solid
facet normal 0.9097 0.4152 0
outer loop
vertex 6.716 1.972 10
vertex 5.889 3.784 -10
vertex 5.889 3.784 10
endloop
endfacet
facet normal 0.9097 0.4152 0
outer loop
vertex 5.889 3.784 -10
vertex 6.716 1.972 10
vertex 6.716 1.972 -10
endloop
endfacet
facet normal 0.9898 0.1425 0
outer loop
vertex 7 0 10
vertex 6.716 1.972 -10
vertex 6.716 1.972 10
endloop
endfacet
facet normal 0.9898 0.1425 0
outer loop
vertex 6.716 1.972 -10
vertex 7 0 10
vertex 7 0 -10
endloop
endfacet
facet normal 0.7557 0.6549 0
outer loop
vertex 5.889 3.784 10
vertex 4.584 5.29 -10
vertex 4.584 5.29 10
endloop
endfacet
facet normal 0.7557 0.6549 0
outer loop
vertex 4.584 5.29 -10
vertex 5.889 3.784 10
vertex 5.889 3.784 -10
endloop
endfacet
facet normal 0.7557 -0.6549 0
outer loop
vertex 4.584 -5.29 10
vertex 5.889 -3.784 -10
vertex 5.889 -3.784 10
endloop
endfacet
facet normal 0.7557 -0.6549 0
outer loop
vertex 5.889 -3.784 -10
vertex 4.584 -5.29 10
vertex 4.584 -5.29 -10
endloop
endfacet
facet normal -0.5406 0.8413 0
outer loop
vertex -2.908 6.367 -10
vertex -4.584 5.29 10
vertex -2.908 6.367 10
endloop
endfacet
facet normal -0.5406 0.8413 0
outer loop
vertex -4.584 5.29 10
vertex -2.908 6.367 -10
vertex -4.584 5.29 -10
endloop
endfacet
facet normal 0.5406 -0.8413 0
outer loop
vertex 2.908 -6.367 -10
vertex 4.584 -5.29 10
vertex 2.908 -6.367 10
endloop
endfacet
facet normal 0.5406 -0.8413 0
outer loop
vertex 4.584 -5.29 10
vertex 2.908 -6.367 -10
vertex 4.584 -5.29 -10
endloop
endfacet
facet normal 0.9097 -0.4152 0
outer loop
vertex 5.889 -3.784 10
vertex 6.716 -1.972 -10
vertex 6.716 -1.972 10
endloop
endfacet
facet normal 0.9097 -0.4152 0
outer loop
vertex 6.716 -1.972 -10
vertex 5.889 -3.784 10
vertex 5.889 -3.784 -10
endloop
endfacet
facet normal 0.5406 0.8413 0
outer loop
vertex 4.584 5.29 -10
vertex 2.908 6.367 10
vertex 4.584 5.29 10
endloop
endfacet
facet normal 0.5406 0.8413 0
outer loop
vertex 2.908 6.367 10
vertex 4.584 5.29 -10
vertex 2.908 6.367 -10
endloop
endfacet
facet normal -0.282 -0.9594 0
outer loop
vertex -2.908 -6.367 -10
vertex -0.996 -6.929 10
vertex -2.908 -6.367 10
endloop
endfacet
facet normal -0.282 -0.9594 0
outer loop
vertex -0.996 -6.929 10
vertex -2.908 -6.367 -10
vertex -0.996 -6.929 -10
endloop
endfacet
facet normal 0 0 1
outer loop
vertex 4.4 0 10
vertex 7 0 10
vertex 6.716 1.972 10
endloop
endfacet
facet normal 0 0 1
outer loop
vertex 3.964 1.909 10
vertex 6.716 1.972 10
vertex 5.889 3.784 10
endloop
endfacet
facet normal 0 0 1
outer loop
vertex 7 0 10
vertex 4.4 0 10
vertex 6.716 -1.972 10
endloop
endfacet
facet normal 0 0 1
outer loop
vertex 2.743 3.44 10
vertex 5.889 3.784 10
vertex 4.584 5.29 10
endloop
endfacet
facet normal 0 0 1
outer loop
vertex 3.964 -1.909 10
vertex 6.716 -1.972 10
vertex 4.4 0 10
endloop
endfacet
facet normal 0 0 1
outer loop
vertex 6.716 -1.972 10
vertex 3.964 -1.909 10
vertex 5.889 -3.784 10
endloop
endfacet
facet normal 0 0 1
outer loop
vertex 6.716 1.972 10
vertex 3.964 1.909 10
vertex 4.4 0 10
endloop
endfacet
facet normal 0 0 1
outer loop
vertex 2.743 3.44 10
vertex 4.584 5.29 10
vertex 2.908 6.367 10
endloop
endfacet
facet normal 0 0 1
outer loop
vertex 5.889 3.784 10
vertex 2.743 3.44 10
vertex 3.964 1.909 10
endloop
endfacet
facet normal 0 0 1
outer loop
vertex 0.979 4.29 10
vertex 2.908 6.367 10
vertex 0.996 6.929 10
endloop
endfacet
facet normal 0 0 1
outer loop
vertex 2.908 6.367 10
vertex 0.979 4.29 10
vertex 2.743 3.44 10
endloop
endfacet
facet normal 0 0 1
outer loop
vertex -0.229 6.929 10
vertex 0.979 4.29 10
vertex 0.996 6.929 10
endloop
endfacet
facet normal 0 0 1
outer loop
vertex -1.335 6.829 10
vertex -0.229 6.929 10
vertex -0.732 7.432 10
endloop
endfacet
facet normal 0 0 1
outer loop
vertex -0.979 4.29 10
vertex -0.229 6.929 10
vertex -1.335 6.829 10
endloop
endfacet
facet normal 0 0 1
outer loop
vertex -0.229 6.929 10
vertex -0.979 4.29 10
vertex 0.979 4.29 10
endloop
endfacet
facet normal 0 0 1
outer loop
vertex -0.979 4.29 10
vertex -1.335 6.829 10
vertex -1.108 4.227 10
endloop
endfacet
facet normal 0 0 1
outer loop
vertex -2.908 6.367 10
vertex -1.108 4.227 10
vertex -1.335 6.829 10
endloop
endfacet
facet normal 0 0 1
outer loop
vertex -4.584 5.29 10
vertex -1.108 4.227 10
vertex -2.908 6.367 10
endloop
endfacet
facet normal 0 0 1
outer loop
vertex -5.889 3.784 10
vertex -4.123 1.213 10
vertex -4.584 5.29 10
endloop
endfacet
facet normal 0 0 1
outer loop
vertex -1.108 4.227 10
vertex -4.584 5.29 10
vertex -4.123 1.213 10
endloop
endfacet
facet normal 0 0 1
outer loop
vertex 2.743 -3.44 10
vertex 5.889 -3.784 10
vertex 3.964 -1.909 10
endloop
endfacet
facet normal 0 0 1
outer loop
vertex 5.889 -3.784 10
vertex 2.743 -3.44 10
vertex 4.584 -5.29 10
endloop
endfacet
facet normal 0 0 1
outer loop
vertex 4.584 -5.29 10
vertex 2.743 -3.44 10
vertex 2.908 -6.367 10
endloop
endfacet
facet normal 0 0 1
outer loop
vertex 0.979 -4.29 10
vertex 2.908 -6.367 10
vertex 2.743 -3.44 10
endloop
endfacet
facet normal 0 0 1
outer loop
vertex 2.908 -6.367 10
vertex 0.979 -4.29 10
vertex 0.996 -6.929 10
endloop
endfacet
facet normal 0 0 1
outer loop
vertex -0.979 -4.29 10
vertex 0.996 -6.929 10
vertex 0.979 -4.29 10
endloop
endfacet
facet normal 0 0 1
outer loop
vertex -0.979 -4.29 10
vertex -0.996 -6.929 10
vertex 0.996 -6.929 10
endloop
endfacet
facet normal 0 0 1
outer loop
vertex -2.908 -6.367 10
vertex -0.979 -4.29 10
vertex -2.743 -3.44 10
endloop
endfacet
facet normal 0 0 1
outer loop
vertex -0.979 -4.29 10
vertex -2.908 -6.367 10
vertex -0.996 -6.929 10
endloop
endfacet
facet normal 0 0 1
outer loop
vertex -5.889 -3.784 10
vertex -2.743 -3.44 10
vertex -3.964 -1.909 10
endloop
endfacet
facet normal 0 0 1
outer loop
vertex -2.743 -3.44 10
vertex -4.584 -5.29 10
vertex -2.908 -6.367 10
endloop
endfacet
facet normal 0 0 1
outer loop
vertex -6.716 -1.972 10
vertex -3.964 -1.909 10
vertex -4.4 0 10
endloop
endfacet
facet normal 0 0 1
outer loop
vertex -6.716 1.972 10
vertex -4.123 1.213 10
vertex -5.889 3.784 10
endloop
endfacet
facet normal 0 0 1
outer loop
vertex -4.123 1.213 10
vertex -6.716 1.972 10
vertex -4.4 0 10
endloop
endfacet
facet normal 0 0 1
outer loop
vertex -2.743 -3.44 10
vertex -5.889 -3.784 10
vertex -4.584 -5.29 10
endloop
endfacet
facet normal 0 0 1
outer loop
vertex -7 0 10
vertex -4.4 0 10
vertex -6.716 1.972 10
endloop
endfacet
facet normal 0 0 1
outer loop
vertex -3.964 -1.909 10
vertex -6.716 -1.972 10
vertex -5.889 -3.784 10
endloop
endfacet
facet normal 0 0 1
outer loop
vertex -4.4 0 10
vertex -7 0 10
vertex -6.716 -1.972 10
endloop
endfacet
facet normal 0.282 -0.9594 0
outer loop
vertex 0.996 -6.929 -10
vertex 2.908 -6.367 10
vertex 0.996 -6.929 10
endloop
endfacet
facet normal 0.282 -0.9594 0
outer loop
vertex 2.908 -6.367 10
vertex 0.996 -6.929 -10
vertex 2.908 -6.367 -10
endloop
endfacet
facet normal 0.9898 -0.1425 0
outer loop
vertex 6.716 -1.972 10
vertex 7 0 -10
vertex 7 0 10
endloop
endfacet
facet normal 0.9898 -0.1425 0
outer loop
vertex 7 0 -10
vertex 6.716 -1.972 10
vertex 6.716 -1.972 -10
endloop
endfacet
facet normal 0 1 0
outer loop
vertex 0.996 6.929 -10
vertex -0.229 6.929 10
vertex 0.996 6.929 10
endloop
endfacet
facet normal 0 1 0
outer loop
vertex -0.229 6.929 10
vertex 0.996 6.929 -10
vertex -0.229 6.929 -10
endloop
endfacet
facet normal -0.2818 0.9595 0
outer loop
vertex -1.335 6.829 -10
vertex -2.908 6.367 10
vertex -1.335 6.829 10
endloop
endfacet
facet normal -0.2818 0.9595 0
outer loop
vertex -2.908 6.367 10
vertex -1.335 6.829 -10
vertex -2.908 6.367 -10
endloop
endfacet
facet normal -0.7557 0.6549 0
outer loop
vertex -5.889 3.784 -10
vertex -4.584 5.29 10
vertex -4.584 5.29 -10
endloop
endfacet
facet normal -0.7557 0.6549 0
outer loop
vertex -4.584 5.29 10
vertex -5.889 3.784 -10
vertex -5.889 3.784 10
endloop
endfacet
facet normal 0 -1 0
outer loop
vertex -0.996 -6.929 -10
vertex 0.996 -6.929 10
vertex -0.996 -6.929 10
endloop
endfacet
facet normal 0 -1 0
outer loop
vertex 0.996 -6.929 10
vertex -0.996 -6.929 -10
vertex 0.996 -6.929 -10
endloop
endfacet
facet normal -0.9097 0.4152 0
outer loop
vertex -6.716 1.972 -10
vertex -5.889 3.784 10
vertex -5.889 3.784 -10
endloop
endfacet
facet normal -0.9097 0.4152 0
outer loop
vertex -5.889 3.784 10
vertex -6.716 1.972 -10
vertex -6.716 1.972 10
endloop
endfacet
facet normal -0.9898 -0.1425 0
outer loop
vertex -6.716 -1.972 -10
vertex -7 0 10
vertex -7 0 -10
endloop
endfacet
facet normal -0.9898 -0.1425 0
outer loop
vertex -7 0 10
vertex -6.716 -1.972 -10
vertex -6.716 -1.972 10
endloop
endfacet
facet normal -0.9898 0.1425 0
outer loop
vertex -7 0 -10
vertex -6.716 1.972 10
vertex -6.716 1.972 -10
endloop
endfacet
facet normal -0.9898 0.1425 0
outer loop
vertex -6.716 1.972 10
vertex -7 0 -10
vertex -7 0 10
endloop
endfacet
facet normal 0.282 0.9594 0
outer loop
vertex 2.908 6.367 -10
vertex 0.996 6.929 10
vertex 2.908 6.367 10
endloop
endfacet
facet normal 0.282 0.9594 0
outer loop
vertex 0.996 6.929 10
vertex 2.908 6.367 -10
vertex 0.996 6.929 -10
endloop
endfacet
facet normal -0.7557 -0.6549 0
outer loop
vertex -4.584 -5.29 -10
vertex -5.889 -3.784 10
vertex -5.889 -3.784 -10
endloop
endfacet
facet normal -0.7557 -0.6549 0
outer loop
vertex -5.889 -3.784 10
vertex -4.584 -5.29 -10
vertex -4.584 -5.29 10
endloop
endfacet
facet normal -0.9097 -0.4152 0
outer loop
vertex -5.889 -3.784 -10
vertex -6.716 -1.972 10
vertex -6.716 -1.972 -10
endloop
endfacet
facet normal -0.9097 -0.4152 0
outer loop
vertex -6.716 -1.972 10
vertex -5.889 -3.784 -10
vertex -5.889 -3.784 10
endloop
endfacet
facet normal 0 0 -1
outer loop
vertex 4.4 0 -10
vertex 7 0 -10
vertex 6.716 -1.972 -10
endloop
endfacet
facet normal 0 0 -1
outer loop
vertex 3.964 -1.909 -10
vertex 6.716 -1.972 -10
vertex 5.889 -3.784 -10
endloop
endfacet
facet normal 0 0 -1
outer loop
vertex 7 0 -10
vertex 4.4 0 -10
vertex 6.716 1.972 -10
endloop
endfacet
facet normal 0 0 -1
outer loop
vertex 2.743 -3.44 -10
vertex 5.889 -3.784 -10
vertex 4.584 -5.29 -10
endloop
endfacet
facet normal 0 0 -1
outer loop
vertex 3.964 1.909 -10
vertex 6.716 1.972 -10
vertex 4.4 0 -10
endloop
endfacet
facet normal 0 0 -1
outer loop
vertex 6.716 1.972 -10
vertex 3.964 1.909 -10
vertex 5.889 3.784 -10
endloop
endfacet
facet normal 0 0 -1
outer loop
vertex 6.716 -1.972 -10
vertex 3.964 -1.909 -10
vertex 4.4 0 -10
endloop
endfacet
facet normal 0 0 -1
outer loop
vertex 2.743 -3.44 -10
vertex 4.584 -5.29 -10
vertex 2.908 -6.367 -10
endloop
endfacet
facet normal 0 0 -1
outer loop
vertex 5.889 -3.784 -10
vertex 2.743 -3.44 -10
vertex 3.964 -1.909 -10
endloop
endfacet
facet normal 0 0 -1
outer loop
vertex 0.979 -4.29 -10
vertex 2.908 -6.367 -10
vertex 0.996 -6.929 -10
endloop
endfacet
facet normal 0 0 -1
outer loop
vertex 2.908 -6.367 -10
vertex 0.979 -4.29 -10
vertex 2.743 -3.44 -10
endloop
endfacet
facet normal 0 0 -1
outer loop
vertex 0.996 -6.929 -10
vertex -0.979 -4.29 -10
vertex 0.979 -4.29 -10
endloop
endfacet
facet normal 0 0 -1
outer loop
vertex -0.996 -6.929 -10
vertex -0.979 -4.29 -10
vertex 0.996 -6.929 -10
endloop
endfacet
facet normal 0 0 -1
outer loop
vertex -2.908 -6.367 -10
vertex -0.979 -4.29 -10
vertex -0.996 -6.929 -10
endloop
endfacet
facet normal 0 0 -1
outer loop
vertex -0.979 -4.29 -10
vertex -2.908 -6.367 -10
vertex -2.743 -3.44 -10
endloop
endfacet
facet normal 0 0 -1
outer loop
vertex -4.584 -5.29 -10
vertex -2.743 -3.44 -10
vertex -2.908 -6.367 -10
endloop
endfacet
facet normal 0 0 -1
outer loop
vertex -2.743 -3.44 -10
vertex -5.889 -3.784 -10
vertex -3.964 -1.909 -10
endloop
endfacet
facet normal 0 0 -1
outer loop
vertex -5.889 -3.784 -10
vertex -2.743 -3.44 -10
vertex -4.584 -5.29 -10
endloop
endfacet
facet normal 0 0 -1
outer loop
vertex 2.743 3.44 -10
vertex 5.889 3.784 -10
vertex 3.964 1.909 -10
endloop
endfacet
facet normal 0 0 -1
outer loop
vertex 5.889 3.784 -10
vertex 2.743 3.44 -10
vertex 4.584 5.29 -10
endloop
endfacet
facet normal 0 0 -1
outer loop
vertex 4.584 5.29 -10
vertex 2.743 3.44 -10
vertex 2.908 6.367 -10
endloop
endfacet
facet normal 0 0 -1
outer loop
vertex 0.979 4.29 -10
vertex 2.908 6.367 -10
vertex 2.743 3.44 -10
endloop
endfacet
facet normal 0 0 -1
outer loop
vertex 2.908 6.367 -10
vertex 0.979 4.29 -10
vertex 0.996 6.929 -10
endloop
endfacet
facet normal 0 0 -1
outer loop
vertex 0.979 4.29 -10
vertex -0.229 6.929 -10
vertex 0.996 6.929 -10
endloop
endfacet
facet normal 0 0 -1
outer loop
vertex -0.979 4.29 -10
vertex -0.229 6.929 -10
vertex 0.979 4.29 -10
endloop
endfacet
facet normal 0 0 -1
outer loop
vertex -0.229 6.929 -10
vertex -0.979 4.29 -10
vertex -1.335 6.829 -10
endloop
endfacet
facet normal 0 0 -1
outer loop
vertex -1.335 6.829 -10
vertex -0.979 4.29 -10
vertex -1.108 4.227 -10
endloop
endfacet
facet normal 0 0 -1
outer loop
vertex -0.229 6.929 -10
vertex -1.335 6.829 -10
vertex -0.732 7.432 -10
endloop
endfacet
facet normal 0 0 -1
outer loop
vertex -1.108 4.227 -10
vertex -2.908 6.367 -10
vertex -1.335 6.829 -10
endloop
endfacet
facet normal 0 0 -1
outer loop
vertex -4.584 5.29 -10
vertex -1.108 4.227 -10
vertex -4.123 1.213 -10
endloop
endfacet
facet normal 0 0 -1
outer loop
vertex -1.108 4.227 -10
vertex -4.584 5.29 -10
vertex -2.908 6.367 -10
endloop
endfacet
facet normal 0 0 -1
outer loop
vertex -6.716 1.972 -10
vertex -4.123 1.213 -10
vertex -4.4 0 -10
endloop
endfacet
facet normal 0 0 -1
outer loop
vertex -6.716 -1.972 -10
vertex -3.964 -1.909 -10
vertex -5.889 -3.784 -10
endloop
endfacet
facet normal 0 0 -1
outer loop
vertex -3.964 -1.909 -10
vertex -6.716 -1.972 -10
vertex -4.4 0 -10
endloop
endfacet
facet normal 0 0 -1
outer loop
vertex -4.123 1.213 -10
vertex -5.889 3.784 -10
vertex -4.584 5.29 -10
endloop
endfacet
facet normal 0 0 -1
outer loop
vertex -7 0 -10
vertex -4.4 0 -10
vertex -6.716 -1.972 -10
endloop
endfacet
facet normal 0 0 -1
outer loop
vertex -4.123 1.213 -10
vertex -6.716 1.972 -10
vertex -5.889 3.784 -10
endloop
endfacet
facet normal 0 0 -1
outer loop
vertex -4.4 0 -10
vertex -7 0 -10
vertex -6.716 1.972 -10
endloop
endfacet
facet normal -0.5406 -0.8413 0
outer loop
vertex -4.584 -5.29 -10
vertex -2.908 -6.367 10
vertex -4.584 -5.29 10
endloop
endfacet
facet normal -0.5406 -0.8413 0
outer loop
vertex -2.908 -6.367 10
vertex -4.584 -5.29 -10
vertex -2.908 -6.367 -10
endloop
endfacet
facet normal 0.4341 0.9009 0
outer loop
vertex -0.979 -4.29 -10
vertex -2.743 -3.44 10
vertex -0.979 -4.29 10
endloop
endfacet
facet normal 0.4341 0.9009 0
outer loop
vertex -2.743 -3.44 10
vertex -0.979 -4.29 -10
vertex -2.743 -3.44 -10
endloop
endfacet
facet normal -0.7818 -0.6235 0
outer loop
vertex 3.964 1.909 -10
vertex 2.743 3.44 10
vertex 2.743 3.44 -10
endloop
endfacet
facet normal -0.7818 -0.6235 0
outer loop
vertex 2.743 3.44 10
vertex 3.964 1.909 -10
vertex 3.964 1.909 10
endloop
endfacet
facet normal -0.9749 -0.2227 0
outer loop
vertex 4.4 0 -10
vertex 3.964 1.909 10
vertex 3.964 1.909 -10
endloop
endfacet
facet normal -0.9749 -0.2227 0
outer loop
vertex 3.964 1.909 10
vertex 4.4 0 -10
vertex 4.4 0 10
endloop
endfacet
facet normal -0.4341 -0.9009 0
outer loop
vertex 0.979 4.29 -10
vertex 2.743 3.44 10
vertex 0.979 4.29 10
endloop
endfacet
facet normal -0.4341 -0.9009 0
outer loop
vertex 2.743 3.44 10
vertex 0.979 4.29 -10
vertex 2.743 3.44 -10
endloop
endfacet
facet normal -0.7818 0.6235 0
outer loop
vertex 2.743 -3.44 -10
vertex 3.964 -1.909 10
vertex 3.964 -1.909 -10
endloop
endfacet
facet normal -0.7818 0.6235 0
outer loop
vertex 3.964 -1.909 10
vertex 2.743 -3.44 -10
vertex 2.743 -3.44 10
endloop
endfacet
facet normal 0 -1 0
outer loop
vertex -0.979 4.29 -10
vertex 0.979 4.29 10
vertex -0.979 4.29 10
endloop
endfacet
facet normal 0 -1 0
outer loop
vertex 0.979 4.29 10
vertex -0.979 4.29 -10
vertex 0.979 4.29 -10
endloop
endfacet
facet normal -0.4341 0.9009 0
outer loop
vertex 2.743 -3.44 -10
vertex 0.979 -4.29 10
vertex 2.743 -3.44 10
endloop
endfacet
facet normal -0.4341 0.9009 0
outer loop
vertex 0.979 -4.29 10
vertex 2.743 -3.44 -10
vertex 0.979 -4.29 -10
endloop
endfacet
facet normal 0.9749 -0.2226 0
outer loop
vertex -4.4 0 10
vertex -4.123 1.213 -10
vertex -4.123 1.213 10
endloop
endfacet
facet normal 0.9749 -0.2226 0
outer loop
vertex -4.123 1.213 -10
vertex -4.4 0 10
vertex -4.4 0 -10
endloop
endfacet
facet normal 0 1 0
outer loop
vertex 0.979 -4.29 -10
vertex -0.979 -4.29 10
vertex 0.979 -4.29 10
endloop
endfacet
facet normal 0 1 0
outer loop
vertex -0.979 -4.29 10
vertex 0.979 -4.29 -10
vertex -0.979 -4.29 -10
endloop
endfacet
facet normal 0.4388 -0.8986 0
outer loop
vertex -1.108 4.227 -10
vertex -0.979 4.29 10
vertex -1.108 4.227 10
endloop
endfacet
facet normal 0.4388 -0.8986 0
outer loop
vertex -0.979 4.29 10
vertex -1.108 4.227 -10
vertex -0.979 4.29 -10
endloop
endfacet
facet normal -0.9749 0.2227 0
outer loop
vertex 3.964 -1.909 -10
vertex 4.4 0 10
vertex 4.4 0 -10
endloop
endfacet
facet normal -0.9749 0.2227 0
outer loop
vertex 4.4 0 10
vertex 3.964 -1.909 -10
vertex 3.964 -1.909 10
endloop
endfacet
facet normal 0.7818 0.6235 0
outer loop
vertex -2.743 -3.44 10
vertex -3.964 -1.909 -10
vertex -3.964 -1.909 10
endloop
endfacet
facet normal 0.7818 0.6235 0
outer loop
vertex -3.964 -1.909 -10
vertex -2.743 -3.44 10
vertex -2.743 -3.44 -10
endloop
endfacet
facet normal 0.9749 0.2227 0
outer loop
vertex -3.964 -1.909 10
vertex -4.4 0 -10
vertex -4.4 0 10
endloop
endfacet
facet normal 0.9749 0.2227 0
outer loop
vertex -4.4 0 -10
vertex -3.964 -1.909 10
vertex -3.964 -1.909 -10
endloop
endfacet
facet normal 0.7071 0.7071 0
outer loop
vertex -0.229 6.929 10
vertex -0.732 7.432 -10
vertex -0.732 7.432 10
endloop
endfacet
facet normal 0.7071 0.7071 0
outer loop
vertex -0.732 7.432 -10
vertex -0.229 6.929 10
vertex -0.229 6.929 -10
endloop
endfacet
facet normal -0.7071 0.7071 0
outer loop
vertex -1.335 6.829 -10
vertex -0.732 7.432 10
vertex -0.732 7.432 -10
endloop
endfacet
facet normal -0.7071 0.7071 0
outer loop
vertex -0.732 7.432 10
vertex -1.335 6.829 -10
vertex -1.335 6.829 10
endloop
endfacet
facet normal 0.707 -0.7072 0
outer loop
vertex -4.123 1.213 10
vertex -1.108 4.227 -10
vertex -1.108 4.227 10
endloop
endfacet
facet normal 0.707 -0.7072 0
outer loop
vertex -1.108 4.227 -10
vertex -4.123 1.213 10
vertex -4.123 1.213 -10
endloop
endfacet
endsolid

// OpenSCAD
height = 20;
difference () {
     cylinder (h=height, r=7, center=true);
     cylinder (h=height+1, r=4.4, center=true);
     }

translate([-2.5,4.25,0]) rotate(45) cube([7,2,height], center=true);
